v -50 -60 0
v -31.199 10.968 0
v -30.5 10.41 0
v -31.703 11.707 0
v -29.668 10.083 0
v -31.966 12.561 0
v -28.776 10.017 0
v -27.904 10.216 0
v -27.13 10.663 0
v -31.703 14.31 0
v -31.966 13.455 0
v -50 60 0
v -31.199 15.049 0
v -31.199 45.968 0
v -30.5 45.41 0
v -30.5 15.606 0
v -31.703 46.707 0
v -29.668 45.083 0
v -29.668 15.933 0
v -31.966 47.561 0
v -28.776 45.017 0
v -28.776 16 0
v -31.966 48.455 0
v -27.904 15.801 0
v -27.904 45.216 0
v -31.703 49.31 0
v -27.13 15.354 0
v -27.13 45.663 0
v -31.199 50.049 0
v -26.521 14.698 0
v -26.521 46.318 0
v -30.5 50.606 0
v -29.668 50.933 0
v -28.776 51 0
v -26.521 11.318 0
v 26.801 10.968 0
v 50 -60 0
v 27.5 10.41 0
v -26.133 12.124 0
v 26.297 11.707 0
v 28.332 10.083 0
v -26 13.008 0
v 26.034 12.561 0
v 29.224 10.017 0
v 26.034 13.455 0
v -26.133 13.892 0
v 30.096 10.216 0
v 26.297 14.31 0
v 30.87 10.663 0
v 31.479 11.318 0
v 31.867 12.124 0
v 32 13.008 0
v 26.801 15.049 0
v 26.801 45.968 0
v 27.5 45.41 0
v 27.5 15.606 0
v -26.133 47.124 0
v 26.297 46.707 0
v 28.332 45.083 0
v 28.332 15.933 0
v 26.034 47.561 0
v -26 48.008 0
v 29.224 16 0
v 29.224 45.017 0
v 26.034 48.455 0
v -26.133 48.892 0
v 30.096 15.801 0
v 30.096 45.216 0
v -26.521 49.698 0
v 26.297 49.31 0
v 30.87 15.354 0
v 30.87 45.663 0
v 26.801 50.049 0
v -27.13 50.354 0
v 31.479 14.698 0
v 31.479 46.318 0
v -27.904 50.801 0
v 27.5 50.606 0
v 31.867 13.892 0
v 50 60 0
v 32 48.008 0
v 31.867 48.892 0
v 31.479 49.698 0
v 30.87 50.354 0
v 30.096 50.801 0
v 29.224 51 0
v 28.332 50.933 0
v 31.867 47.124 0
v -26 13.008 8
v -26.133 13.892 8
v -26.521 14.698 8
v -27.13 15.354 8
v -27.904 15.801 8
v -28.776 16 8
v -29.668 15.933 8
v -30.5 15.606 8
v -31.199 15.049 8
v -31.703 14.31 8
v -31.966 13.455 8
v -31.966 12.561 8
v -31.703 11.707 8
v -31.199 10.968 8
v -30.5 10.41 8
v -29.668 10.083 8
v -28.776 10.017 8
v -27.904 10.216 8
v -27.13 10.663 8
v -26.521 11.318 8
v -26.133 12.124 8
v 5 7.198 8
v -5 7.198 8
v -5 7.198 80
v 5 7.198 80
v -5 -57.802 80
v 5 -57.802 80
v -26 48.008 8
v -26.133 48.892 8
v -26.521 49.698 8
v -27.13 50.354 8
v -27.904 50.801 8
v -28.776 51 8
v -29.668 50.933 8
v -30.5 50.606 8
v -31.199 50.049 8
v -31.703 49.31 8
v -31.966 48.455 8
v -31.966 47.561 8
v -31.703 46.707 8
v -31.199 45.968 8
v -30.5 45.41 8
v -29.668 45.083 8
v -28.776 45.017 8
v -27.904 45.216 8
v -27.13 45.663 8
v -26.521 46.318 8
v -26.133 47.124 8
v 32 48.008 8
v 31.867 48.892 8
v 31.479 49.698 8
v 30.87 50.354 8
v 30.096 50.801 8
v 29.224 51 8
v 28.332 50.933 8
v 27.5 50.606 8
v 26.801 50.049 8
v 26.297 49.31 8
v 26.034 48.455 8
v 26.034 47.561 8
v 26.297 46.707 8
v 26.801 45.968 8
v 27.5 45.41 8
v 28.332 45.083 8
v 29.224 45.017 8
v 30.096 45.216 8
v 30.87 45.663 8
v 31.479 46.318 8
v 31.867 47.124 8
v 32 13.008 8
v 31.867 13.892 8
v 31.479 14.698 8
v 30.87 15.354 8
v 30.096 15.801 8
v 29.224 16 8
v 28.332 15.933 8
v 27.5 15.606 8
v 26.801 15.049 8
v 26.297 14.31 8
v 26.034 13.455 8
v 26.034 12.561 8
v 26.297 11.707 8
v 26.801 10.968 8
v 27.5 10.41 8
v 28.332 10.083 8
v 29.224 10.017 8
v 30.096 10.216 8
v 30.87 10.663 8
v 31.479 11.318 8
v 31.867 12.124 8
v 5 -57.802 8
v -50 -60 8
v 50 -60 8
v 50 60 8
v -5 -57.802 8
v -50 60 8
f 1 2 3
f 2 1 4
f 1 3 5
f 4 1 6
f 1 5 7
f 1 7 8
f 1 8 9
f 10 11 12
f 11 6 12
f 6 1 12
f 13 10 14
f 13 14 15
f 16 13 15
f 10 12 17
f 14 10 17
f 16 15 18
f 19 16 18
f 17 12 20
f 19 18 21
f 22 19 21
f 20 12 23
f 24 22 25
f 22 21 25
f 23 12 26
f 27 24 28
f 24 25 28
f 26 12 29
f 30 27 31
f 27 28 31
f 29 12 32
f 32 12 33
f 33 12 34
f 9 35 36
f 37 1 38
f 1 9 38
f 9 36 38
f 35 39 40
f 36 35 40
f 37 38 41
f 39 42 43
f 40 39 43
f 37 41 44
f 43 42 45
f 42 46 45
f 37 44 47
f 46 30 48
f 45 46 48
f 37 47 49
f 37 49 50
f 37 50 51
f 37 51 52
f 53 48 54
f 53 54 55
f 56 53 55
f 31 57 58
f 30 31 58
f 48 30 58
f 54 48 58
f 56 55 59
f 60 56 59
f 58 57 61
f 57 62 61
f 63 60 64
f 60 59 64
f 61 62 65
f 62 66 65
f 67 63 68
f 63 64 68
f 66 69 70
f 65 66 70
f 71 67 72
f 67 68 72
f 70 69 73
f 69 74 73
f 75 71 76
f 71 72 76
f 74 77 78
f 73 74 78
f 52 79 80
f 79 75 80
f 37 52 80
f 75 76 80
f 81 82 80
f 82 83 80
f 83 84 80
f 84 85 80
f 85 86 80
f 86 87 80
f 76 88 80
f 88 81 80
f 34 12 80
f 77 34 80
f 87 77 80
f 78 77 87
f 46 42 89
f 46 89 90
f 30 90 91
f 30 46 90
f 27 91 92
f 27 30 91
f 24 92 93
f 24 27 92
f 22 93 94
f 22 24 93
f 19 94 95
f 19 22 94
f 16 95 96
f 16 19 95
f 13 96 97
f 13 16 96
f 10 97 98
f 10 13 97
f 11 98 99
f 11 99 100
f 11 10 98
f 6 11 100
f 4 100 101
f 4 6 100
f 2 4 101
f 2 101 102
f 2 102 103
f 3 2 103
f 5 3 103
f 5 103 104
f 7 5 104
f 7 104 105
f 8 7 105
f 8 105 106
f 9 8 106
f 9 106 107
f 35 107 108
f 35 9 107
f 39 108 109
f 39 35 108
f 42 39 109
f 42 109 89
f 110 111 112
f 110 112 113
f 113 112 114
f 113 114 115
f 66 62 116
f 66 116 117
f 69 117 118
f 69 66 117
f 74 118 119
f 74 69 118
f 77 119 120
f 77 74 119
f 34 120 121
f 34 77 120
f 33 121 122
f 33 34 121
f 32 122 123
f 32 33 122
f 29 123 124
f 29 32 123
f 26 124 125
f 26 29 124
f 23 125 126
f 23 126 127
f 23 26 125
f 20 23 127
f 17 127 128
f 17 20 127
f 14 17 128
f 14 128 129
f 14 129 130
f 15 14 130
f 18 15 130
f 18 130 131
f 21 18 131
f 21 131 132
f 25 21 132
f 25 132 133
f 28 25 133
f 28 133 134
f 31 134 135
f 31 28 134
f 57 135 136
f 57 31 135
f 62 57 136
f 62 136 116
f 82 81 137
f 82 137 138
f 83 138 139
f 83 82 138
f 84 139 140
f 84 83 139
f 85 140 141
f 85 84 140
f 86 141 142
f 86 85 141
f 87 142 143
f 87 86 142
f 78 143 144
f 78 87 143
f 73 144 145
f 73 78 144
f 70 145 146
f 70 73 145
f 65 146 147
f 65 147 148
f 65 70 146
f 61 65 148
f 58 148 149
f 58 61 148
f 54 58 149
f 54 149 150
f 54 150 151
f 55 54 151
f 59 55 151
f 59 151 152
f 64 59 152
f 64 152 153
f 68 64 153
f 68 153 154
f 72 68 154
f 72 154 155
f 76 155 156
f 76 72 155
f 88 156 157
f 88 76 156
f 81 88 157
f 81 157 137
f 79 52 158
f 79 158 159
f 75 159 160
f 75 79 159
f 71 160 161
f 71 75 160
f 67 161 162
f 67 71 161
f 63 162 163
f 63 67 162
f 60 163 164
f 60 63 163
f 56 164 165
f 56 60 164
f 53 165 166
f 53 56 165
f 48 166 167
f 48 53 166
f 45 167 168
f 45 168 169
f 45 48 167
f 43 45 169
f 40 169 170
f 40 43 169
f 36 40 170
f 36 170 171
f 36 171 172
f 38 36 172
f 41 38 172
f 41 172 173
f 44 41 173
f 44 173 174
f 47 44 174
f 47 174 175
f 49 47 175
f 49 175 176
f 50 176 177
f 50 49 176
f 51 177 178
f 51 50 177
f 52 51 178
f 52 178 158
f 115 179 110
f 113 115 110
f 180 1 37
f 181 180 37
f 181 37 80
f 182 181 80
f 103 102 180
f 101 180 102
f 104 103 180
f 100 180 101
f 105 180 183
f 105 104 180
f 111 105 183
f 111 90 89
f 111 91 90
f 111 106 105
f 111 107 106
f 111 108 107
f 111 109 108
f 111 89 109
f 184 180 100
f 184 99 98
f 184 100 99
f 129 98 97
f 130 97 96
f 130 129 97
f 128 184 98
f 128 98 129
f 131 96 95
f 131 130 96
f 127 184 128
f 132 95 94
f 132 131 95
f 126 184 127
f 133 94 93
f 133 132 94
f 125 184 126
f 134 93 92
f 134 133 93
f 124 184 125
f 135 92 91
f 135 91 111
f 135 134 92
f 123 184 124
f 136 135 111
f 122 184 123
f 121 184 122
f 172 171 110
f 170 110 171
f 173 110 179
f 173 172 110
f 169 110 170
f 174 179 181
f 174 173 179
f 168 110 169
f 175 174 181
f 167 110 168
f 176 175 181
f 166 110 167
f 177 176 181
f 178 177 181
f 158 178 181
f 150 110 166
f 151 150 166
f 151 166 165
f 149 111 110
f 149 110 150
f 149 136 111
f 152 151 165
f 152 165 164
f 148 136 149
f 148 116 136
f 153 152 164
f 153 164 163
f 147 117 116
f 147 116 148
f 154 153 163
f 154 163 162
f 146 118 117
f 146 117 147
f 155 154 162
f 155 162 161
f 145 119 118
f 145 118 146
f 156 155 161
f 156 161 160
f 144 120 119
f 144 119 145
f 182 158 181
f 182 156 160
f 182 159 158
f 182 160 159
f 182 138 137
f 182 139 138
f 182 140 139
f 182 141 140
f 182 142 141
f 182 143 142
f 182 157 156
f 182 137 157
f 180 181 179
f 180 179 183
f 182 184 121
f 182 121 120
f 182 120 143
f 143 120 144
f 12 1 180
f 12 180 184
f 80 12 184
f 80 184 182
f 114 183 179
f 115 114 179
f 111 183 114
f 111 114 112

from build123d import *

# Parameters (mm, degrees)
F0_W     = 100
F0_H     = 120
F0_W_2   = 10
F0_H_2   = 65
F0_R     = 3
F1_DEPTH = 8
F2_DEPTH = 80


with BuildPart() as f1:
    # F0 (on Top) → F1 (new body)
    with BuildSketch(Plane.XY):
        Rectangle(F0_W, F0_H)
        with Locations((0, -25.301723)):
            Rectangle(F0_W_2, F0_H_2, mode=Mode.SUBTRACT)
        with Locations((-28.999999, 13.00821)):
            Circle(F0_R, mode=Mode.SUBTRACT)
        with Locations((-29, 48.00821)):
            Circle(F0_R, mode=Mode.SUBTRACT)
        with Locations((29.000001, 13.00821)):
            Circle(F0_R, mode=Mode.SUBTRACT)
        with Locations((29, 48.00821)):
            Circle(F0_R, mode=Mode.SUBTRACT)
        with Locations((0, -25.301723)):
            Rectangle(F0_W_2, F0_H_2)
    extrude(amount=F1_DEPTH)

    # F0 (on Top) → F2 (join)
    with BuildSketch(Plane.XY):
        with Locations((0, -25.301723)):
            Rectangle(F0_W_2, F0_H_2)
    extrude(amount=F2_DEPTH)


solid = f1.part
